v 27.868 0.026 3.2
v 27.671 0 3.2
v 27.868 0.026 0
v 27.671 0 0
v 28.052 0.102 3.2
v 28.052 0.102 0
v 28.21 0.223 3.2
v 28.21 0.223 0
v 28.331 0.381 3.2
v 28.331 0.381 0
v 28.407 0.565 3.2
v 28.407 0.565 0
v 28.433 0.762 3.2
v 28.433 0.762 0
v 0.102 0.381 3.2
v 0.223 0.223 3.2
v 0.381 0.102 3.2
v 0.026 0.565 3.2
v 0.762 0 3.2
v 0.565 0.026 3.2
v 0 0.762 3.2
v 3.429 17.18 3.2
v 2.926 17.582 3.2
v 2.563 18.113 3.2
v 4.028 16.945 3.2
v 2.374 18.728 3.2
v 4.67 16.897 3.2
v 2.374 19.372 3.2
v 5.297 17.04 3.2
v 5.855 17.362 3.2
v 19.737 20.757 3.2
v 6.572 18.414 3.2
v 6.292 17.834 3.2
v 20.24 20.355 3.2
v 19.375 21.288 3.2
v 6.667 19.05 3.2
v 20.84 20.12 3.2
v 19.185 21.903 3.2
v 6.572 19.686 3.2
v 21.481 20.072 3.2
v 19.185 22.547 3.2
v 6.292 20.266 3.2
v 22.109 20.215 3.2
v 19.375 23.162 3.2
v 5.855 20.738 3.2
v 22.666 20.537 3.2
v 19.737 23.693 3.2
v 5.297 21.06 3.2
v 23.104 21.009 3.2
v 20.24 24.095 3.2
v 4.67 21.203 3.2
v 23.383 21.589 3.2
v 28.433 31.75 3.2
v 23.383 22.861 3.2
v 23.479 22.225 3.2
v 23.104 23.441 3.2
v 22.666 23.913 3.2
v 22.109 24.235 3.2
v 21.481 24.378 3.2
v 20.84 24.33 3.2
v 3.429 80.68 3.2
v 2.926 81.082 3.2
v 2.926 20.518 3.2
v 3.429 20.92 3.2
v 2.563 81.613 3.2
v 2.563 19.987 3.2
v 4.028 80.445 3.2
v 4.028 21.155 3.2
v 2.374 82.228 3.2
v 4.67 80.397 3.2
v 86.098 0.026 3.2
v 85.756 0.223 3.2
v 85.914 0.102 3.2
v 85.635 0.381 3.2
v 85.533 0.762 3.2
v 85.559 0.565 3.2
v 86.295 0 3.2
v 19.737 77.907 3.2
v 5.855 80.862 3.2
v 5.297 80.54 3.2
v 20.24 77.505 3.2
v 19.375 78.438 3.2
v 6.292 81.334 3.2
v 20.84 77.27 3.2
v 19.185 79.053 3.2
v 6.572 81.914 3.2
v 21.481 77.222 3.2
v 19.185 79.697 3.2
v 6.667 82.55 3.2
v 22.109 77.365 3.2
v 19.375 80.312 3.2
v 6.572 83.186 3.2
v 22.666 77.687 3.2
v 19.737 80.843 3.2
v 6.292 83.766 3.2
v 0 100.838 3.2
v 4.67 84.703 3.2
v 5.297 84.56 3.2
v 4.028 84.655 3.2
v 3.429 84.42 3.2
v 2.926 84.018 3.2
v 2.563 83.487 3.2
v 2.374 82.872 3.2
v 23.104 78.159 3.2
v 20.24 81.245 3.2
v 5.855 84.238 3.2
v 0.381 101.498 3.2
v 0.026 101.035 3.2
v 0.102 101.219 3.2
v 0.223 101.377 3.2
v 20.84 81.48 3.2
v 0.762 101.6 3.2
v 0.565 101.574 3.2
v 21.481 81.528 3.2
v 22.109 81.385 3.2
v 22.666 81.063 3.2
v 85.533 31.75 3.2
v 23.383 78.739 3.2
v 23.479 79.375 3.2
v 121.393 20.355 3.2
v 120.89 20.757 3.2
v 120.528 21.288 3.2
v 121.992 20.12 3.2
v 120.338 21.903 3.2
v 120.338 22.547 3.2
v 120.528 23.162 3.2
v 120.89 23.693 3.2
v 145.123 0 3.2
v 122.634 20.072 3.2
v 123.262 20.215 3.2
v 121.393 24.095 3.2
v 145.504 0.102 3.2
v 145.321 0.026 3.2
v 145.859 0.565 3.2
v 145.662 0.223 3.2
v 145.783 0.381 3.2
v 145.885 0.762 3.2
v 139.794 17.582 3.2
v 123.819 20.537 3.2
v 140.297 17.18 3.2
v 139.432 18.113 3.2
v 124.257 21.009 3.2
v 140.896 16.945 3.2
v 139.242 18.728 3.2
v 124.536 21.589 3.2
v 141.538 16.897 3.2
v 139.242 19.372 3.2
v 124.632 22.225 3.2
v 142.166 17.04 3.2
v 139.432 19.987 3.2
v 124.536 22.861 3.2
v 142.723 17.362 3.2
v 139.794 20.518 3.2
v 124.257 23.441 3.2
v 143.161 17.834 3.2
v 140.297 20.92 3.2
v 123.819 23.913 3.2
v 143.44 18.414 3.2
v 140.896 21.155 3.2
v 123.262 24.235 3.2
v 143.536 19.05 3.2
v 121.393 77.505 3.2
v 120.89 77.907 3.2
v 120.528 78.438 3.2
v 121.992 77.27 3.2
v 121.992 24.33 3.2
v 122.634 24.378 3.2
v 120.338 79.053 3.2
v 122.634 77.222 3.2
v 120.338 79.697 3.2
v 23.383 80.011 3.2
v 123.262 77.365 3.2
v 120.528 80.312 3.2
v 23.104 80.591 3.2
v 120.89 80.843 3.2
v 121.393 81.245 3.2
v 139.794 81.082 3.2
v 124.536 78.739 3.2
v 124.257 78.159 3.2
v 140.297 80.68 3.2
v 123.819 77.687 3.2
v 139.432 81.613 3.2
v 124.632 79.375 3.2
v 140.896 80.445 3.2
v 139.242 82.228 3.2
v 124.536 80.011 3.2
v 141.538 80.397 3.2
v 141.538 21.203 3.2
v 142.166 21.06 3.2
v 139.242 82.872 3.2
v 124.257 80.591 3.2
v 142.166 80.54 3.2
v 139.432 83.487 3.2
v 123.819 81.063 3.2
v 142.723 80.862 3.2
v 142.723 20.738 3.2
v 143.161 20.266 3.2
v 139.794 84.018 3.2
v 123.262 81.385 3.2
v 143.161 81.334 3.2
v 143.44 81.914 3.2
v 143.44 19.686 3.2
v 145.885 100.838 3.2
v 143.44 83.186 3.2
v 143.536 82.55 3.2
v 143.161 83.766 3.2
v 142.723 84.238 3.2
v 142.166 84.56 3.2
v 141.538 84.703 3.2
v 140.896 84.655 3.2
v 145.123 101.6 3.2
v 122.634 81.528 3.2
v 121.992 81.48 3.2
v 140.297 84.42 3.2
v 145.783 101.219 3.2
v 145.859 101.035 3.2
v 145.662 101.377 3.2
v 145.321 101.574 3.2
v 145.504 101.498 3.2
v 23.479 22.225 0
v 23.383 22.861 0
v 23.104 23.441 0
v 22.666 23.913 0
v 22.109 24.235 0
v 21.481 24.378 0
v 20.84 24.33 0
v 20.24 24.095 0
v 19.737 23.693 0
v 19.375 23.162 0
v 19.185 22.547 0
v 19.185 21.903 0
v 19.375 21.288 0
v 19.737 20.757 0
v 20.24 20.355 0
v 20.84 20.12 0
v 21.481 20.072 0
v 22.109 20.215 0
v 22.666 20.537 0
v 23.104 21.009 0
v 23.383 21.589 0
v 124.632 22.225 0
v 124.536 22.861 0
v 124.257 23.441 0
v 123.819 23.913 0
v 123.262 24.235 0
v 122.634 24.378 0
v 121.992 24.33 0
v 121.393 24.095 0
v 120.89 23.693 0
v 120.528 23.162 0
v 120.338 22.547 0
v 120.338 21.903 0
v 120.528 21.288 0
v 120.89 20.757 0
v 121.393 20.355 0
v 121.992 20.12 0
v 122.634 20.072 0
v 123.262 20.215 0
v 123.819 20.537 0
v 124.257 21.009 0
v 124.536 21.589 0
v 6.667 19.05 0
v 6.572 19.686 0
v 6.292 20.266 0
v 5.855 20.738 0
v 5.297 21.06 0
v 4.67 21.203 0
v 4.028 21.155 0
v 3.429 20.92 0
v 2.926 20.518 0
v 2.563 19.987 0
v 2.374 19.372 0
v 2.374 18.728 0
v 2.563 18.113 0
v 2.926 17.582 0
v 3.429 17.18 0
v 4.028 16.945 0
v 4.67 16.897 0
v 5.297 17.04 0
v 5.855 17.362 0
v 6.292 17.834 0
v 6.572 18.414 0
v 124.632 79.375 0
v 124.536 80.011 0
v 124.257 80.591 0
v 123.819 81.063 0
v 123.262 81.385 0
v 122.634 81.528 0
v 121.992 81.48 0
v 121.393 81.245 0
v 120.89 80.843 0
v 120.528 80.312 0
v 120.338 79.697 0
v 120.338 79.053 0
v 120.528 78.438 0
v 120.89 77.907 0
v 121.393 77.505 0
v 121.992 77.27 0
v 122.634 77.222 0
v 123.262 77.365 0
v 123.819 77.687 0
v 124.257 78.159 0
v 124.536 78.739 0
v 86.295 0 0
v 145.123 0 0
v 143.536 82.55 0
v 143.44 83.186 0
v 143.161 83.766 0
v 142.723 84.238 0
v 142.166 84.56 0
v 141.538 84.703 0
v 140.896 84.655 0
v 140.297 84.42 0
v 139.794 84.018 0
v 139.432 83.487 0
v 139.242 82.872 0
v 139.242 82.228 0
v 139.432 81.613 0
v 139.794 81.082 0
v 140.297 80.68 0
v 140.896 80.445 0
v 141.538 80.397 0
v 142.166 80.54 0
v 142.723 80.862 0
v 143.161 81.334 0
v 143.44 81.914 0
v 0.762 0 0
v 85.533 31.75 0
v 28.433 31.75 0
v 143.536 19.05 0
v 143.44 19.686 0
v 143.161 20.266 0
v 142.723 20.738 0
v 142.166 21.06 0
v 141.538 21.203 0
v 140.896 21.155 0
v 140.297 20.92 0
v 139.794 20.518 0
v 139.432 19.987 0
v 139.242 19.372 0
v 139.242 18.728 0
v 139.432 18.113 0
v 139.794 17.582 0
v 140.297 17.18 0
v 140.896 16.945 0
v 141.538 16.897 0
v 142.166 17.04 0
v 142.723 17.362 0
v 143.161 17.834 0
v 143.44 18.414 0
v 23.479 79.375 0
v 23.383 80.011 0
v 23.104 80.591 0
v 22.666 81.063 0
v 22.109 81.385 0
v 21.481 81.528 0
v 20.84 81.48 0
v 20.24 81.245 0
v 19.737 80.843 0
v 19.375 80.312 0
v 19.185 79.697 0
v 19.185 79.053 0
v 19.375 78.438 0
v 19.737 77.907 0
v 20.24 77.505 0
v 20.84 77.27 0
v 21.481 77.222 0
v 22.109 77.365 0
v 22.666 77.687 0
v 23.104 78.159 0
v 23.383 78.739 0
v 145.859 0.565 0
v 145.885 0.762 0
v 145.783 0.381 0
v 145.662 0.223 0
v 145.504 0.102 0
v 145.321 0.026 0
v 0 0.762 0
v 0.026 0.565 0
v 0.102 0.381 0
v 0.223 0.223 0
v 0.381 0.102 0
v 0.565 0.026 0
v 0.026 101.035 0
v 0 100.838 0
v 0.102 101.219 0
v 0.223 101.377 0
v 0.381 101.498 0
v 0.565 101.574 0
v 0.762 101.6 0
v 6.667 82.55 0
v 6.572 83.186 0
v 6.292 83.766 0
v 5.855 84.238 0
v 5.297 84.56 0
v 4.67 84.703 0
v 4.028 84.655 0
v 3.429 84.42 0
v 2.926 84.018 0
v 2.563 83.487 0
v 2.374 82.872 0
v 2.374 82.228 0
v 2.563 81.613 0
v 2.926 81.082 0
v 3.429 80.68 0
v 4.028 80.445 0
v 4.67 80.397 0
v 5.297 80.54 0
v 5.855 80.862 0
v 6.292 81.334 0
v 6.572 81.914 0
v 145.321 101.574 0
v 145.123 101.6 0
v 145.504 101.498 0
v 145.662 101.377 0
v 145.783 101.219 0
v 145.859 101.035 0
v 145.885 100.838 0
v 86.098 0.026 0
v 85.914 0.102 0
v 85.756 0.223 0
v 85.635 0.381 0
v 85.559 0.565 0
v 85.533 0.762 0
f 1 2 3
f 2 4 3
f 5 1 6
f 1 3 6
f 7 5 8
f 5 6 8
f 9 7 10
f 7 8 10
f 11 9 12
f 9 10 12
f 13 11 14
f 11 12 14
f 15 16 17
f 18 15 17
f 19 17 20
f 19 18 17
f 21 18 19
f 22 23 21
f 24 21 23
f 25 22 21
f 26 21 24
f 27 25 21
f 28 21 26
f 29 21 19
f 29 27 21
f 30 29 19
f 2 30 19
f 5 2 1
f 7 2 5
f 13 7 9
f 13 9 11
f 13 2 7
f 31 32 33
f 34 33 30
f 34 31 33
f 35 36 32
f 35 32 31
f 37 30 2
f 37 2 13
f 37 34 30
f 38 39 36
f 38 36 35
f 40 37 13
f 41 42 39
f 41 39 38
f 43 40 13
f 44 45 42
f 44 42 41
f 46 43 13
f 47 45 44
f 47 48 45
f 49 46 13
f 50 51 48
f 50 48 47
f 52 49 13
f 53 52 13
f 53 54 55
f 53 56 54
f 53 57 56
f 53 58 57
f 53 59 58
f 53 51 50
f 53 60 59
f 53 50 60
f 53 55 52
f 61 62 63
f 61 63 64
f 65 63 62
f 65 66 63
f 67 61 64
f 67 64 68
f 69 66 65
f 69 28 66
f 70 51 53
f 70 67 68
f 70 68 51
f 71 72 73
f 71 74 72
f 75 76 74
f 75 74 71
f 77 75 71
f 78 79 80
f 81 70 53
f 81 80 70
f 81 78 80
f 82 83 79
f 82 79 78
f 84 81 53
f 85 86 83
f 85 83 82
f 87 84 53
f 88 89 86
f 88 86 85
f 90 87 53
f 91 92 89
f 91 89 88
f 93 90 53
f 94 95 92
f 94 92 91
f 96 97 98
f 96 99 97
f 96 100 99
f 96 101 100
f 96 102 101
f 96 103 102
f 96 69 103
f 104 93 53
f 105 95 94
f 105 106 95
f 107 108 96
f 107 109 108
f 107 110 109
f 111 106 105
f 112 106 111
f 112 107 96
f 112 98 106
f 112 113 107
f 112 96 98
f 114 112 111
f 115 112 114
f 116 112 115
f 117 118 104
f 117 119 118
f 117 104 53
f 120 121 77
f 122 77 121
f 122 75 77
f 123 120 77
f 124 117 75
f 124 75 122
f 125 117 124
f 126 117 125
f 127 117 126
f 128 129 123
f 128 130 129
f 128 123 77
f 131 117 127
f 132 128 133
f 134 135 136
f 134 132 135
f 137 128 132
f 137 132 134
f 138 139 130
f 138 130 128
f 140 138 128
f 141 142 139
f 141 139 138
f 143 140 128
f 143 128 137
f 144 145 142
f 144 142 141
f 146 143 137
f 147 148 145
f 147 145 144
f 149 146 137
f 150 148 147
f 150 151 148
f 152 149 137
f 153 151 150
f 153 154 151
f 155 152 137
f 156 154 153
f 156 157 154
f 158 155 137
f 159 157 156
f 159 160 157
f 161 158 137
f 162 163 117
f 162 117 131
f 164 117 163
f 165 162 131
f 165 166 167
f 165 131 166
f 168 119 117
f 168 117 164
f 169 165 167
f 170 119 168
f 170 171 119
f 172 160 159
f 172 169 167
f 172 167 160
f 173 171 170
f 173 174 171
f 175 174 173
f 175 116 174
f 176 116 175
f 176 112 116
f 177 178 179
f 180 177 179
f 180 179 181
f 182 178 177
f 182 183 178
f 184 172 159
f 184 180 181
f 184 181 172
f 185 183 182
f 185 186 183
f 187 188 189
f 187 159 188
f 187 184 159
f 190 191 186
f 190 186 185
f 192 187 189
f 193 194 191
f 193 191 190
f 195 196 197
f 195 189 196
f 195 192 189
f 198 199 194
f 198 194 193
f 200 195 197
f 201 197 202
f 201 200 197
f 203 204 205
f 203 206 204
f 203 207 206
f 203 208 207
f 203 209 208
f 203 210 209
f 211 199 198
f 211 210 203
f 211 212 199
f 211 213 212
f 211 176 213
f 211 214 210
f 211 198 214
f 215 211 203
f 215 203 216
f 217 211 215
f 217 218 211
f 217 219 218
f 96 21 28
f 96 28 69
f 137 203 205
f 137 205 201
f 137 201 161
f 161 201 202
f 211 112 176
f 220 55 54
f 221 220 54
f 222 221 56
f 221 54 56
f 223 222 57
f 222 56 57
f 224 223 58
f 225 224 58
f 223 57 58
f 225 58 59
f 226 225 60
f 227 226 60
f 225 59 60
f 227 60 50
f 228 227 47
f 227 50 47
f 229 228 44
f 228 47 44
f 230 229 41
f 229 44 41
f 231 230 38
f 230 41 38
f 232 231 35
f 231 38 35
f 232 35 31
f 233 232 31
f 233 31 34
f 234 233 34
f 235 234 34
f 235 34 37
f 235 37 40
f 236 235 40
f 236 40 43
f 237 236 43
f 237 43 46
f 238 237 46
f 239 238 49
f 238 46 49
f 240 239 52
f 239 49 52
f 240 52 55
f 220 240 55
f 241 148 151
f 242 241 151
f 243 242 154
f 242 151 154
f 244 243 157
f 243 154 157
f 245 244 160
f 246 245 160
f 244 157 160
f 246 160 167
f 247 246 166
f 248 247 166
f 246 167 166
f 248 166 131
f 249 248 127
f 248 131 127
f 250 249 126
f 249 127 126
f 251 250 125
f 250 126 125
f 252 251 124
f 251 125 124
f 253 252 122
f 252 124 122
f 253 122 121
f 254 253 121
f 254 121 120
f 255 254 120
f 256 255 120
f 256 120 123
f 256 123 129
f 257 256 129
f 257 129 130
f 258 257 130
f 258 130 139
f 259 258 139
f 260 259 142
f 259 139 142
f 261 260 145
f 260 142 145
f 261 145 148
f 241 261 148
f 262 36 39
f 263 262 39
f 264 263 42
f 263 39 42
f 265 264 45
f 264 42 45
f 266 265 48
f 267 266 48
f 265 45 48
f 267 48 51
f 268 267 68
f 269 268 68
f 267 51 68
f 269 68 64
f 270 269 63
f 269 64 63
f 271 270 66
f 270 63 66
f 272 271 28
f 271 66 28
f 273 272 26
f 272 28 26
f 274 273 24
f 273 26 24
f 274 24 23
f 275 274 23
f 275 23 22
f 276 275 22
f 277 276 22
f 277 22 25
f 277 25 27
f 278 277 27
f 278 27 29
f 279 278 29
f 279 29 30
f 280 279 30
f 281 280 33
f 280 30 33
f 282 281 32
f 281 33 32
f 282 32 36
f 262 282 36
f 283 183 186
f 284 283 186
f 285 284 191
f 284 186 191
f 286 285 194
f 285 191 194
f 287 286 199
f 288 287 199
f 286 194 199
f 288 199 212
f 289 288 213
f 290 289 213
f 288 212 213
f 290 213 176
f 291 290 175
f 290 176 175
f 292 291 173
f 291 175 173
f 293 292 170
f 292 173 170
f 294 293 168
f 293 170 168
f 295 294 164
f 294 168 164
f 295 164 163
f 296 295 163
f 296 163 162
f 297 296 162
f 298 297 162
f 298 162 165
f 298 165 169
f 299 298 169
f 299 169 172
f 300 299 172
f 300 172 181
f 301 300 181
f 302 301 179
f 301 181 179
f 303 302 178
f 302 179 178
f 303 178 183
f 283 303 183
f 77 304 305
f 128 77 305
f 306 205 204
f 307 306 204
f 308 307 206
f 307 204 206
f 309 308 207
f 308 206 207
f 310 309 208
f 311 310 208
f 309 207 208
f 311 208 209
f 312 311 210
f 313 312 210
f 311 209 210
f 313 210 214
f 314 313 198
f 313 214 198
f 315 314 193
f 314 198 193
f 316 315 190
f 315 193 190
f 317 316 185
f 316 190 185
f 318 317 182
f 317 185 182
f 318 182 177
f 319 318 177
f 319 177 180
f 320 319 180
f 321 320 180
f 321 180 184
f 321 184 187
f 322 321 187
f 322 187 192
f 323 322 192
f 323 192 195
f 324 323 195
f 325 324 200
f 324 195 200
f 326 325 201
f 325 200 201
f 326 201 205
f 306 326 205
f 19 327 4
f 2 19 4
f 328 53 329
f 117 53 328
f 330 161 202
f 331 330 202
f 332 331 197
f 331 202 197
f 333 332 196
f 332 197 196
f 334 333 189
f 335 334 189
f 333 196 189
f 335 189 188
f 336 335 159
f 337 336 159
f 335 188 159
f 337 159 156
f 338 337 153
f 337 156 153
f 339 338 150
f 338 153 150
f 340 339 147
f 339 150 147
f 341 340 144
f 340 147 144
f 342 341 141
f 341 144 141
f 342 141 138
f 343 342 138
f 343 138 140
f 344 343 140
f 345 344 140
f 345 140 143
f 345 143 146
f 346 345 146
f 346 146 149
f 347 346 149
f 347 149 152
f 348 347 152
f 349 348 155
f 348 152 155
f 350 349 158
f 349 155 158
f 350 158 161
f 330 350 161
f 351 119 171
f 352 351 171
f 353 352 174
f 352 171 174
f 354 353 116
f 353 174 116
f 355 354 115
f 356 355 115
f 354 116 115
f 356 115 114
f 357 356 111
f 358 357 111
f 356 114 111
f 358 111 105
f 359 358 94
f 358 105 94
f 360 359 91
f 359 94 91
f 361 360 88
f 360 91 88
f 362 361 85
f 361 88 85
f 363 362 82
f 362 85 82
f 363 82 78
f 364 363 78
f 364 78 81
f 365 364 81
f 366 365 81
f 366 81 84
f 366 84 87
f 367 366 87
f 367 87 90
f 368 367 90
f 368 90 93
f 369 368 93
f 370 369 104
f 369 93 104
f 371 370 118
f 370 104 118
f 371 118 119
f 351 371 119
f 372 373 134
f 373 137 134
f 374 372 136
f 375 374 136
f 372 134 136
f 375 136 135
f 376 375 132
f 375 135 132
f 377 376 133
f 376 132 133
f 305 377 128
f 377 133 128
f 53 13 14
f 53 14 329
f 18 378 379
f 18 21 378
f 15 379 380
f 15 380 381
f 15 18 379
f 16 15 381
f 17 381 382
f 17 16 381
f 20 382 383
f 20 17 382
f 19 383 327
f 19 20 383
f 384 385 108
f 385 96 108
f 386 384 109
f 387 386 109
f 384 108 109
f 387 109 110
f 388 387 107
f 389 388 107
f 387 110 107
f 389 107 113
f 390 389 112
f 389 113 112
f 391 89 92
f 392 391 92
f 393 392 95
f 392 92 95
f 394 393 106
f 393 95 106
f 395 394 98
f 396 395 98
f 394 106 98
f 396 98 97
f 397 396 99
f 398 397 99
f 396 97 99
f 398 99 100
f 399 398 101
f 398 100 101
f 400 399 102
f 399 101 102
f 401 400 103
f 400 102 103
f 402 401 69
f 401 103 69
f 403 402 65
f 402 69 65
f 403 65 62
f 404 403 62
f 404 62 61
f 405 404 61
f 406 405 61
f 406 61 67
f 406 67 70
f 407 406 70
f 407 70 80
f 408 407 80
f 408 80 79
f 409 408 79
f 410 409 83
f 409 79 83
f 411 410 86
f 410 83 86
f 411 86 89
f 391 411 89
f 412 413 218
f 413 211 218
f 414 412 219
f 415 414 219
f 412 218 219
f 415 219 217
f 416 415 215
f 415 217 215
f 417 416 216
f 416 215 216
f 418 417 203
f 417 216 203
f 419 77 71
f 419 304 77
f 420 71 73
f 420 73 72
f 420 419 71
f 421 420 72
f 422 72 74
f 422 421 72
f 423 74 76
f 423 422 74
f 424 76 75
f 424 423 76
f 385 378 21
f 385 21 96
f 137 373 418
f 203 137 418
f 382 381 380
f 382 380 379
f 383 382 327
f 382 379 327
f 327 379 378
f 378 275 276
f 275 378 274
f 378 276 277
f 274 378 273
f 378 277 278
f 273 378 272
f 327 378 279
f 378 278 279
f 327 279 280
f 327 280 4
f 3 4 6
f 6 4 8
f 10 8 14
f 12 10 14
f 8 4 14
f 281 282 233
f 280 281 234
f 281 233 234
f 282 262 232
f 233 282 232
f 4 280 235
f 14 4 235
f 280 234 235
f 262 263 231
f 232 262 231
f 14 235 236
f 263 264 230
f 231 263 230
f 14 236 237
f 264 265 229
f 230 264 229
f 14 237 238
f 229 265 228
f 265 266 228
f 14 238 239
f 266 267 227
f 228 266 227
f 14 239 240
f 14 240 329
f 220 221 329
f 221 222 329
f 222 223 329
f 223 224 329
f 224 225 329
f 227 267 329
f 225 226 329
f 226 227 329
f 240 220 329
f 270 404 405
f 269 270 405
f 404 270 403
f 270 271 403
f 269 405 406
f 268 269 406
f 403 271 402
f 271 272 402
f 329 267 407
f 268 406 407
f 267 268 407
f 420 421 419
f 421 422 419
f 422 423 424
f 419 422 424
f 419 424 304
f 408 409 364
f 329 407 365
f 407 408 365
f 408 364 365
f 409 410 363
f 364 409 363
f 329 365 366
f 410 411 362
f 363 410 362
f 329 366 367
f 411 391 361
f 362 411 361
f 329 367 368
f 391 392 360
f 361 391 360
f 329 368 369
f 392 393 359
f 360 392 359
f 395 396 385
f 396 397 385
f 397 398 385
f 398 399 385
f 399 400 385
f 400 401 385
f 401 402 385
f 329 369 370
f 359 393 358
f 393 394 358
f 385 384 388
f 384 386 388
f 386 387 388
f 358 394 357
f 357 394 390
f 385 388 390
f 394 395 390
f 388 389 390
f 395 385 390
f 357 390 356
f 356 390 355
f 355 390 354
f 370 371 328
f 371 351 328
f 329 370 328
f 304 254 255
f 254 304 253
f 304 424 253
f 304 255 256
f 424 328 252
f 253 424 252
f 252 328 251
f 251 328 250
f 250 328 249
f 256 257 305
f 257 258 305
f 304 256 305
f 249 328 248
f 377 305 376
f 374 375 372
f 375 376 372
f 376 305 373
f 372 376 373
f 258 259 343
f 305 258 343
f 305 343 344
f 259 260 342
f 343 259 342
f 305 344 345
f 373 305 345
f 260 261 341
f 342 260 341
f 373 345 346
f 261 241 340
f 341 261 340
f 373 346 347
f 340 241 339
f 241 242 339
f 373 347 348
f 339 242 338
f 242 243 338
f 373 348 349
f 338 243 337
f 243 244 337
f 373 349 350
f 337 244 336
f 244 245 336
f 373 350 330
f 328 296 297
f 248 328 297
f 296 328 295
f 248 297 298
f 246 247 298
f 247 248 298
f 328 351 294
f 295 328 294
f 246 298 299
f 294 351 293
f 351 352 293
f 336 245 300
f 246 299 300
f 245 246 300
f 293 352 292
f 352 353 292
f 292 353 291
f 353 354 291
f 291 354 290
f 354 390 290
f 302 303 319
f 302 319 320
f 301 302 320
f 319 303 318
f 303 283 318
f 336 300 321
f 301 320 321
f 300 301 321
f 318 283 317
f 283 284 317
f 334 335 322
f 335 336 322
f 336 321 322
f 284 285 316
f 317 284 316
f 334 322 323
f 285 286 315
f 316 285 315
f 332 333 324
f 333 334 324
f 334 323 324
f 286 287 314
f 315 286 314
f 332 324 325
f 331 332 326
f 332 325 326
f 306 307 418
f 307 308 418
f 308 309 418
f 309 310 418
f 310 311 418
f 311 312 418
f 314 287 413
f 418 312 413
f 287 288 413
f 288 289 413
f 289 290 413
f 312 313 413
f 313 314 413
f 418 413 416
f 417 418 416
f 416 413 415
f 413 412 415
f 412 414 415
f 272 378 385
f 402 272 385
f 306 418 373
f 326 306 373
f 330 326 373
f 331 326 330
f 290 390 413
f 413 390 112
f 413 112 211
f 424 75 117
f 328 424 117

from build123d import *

# Parameters (mm, degrees)
SKETCH1_W           = 145.885353282
SKETCH1_H           = 101.6
BOSS_EXTRUDE1_DEPTH = 3.2004
SKETCH4_W           = 57.100000132
SKETCH4_H           = 31.75
CUT_EXTRUDE1_DEPTH  = 3.2004
SKETCH5_R           = 2.159
CUT_EXTRUDE2_DEPTH  = 3.2004
FILLET1_R           = 0.762


with BuildPart() as part:
    # Sketch1 → Boss-Extrude1 (new body)
    with BuildSketch(Plane.XY):
        with Locations((72.942676641, 50.8)):
            Rectangle(SKETCH1_W, SKETCH1_H)
    extrude(amount=BOSS_EXTRUDE1_DEPTH)

    # Sketch4 → Cut-Extrude1 (cut)
    with BuildSketch(Plane.XY.offset(3.2004)):
        with Locations((56.982760066, 15.875)):
            Rectangle(SKETCH4_W, SKETCH4_H)
    extrude(amount=-CUT_EXTRUDE1_DEPTH, mode=Mode.SUBTRACT)

    # Sketch5 → Cut-Extrude2 (cut)
    with BuildSketch(Plane.XY.offset(3.2004)):
        with Locations((141.376853282, 82.55)):
            Circle(SKETCH5_R)
        with Locations((141.376853282, 19.05)):
            Circle(SKETCH5_R)
        with Locations((4.5085, 19.05)):
            Circle(SKETCH5_R)
        with Locations((4.5085, 82.55)):
            Circle(SKETCH5_R)
        with Locations((21.31994339, 79.375)):
            Circle(SKETCH5_R)
        with Locations((21.31994339, 22.225)):
            Circle(SKETCH5_R)
        with Locations((122.472903282, 79.375)):
            Circle(SKETCH5_R)
        with Locations((122.472903282, 22.225)):
            Circle(SKETCH5_R)
    extrude(amount=-CUT_EXTRUDE2_DEPTH, mode=Mode.SUBTRACT)

    # Fillet1
    fillet1_edges = [part.edges().sort_by_distance(p)[0] for p in [
        (28.43276, 0, 1.6002),
        (85.532760132, 0, 1.6002),
        (0, 101.6, 1.6002),
        (145.885353282, 101.6, 1.6002),
        (145.885353282, 0, 1.6002),
        (0, 0, 1.6002),
    ]]
    fillet(fillet1_edges, radius=FILLET1_R)


solid = part.part
